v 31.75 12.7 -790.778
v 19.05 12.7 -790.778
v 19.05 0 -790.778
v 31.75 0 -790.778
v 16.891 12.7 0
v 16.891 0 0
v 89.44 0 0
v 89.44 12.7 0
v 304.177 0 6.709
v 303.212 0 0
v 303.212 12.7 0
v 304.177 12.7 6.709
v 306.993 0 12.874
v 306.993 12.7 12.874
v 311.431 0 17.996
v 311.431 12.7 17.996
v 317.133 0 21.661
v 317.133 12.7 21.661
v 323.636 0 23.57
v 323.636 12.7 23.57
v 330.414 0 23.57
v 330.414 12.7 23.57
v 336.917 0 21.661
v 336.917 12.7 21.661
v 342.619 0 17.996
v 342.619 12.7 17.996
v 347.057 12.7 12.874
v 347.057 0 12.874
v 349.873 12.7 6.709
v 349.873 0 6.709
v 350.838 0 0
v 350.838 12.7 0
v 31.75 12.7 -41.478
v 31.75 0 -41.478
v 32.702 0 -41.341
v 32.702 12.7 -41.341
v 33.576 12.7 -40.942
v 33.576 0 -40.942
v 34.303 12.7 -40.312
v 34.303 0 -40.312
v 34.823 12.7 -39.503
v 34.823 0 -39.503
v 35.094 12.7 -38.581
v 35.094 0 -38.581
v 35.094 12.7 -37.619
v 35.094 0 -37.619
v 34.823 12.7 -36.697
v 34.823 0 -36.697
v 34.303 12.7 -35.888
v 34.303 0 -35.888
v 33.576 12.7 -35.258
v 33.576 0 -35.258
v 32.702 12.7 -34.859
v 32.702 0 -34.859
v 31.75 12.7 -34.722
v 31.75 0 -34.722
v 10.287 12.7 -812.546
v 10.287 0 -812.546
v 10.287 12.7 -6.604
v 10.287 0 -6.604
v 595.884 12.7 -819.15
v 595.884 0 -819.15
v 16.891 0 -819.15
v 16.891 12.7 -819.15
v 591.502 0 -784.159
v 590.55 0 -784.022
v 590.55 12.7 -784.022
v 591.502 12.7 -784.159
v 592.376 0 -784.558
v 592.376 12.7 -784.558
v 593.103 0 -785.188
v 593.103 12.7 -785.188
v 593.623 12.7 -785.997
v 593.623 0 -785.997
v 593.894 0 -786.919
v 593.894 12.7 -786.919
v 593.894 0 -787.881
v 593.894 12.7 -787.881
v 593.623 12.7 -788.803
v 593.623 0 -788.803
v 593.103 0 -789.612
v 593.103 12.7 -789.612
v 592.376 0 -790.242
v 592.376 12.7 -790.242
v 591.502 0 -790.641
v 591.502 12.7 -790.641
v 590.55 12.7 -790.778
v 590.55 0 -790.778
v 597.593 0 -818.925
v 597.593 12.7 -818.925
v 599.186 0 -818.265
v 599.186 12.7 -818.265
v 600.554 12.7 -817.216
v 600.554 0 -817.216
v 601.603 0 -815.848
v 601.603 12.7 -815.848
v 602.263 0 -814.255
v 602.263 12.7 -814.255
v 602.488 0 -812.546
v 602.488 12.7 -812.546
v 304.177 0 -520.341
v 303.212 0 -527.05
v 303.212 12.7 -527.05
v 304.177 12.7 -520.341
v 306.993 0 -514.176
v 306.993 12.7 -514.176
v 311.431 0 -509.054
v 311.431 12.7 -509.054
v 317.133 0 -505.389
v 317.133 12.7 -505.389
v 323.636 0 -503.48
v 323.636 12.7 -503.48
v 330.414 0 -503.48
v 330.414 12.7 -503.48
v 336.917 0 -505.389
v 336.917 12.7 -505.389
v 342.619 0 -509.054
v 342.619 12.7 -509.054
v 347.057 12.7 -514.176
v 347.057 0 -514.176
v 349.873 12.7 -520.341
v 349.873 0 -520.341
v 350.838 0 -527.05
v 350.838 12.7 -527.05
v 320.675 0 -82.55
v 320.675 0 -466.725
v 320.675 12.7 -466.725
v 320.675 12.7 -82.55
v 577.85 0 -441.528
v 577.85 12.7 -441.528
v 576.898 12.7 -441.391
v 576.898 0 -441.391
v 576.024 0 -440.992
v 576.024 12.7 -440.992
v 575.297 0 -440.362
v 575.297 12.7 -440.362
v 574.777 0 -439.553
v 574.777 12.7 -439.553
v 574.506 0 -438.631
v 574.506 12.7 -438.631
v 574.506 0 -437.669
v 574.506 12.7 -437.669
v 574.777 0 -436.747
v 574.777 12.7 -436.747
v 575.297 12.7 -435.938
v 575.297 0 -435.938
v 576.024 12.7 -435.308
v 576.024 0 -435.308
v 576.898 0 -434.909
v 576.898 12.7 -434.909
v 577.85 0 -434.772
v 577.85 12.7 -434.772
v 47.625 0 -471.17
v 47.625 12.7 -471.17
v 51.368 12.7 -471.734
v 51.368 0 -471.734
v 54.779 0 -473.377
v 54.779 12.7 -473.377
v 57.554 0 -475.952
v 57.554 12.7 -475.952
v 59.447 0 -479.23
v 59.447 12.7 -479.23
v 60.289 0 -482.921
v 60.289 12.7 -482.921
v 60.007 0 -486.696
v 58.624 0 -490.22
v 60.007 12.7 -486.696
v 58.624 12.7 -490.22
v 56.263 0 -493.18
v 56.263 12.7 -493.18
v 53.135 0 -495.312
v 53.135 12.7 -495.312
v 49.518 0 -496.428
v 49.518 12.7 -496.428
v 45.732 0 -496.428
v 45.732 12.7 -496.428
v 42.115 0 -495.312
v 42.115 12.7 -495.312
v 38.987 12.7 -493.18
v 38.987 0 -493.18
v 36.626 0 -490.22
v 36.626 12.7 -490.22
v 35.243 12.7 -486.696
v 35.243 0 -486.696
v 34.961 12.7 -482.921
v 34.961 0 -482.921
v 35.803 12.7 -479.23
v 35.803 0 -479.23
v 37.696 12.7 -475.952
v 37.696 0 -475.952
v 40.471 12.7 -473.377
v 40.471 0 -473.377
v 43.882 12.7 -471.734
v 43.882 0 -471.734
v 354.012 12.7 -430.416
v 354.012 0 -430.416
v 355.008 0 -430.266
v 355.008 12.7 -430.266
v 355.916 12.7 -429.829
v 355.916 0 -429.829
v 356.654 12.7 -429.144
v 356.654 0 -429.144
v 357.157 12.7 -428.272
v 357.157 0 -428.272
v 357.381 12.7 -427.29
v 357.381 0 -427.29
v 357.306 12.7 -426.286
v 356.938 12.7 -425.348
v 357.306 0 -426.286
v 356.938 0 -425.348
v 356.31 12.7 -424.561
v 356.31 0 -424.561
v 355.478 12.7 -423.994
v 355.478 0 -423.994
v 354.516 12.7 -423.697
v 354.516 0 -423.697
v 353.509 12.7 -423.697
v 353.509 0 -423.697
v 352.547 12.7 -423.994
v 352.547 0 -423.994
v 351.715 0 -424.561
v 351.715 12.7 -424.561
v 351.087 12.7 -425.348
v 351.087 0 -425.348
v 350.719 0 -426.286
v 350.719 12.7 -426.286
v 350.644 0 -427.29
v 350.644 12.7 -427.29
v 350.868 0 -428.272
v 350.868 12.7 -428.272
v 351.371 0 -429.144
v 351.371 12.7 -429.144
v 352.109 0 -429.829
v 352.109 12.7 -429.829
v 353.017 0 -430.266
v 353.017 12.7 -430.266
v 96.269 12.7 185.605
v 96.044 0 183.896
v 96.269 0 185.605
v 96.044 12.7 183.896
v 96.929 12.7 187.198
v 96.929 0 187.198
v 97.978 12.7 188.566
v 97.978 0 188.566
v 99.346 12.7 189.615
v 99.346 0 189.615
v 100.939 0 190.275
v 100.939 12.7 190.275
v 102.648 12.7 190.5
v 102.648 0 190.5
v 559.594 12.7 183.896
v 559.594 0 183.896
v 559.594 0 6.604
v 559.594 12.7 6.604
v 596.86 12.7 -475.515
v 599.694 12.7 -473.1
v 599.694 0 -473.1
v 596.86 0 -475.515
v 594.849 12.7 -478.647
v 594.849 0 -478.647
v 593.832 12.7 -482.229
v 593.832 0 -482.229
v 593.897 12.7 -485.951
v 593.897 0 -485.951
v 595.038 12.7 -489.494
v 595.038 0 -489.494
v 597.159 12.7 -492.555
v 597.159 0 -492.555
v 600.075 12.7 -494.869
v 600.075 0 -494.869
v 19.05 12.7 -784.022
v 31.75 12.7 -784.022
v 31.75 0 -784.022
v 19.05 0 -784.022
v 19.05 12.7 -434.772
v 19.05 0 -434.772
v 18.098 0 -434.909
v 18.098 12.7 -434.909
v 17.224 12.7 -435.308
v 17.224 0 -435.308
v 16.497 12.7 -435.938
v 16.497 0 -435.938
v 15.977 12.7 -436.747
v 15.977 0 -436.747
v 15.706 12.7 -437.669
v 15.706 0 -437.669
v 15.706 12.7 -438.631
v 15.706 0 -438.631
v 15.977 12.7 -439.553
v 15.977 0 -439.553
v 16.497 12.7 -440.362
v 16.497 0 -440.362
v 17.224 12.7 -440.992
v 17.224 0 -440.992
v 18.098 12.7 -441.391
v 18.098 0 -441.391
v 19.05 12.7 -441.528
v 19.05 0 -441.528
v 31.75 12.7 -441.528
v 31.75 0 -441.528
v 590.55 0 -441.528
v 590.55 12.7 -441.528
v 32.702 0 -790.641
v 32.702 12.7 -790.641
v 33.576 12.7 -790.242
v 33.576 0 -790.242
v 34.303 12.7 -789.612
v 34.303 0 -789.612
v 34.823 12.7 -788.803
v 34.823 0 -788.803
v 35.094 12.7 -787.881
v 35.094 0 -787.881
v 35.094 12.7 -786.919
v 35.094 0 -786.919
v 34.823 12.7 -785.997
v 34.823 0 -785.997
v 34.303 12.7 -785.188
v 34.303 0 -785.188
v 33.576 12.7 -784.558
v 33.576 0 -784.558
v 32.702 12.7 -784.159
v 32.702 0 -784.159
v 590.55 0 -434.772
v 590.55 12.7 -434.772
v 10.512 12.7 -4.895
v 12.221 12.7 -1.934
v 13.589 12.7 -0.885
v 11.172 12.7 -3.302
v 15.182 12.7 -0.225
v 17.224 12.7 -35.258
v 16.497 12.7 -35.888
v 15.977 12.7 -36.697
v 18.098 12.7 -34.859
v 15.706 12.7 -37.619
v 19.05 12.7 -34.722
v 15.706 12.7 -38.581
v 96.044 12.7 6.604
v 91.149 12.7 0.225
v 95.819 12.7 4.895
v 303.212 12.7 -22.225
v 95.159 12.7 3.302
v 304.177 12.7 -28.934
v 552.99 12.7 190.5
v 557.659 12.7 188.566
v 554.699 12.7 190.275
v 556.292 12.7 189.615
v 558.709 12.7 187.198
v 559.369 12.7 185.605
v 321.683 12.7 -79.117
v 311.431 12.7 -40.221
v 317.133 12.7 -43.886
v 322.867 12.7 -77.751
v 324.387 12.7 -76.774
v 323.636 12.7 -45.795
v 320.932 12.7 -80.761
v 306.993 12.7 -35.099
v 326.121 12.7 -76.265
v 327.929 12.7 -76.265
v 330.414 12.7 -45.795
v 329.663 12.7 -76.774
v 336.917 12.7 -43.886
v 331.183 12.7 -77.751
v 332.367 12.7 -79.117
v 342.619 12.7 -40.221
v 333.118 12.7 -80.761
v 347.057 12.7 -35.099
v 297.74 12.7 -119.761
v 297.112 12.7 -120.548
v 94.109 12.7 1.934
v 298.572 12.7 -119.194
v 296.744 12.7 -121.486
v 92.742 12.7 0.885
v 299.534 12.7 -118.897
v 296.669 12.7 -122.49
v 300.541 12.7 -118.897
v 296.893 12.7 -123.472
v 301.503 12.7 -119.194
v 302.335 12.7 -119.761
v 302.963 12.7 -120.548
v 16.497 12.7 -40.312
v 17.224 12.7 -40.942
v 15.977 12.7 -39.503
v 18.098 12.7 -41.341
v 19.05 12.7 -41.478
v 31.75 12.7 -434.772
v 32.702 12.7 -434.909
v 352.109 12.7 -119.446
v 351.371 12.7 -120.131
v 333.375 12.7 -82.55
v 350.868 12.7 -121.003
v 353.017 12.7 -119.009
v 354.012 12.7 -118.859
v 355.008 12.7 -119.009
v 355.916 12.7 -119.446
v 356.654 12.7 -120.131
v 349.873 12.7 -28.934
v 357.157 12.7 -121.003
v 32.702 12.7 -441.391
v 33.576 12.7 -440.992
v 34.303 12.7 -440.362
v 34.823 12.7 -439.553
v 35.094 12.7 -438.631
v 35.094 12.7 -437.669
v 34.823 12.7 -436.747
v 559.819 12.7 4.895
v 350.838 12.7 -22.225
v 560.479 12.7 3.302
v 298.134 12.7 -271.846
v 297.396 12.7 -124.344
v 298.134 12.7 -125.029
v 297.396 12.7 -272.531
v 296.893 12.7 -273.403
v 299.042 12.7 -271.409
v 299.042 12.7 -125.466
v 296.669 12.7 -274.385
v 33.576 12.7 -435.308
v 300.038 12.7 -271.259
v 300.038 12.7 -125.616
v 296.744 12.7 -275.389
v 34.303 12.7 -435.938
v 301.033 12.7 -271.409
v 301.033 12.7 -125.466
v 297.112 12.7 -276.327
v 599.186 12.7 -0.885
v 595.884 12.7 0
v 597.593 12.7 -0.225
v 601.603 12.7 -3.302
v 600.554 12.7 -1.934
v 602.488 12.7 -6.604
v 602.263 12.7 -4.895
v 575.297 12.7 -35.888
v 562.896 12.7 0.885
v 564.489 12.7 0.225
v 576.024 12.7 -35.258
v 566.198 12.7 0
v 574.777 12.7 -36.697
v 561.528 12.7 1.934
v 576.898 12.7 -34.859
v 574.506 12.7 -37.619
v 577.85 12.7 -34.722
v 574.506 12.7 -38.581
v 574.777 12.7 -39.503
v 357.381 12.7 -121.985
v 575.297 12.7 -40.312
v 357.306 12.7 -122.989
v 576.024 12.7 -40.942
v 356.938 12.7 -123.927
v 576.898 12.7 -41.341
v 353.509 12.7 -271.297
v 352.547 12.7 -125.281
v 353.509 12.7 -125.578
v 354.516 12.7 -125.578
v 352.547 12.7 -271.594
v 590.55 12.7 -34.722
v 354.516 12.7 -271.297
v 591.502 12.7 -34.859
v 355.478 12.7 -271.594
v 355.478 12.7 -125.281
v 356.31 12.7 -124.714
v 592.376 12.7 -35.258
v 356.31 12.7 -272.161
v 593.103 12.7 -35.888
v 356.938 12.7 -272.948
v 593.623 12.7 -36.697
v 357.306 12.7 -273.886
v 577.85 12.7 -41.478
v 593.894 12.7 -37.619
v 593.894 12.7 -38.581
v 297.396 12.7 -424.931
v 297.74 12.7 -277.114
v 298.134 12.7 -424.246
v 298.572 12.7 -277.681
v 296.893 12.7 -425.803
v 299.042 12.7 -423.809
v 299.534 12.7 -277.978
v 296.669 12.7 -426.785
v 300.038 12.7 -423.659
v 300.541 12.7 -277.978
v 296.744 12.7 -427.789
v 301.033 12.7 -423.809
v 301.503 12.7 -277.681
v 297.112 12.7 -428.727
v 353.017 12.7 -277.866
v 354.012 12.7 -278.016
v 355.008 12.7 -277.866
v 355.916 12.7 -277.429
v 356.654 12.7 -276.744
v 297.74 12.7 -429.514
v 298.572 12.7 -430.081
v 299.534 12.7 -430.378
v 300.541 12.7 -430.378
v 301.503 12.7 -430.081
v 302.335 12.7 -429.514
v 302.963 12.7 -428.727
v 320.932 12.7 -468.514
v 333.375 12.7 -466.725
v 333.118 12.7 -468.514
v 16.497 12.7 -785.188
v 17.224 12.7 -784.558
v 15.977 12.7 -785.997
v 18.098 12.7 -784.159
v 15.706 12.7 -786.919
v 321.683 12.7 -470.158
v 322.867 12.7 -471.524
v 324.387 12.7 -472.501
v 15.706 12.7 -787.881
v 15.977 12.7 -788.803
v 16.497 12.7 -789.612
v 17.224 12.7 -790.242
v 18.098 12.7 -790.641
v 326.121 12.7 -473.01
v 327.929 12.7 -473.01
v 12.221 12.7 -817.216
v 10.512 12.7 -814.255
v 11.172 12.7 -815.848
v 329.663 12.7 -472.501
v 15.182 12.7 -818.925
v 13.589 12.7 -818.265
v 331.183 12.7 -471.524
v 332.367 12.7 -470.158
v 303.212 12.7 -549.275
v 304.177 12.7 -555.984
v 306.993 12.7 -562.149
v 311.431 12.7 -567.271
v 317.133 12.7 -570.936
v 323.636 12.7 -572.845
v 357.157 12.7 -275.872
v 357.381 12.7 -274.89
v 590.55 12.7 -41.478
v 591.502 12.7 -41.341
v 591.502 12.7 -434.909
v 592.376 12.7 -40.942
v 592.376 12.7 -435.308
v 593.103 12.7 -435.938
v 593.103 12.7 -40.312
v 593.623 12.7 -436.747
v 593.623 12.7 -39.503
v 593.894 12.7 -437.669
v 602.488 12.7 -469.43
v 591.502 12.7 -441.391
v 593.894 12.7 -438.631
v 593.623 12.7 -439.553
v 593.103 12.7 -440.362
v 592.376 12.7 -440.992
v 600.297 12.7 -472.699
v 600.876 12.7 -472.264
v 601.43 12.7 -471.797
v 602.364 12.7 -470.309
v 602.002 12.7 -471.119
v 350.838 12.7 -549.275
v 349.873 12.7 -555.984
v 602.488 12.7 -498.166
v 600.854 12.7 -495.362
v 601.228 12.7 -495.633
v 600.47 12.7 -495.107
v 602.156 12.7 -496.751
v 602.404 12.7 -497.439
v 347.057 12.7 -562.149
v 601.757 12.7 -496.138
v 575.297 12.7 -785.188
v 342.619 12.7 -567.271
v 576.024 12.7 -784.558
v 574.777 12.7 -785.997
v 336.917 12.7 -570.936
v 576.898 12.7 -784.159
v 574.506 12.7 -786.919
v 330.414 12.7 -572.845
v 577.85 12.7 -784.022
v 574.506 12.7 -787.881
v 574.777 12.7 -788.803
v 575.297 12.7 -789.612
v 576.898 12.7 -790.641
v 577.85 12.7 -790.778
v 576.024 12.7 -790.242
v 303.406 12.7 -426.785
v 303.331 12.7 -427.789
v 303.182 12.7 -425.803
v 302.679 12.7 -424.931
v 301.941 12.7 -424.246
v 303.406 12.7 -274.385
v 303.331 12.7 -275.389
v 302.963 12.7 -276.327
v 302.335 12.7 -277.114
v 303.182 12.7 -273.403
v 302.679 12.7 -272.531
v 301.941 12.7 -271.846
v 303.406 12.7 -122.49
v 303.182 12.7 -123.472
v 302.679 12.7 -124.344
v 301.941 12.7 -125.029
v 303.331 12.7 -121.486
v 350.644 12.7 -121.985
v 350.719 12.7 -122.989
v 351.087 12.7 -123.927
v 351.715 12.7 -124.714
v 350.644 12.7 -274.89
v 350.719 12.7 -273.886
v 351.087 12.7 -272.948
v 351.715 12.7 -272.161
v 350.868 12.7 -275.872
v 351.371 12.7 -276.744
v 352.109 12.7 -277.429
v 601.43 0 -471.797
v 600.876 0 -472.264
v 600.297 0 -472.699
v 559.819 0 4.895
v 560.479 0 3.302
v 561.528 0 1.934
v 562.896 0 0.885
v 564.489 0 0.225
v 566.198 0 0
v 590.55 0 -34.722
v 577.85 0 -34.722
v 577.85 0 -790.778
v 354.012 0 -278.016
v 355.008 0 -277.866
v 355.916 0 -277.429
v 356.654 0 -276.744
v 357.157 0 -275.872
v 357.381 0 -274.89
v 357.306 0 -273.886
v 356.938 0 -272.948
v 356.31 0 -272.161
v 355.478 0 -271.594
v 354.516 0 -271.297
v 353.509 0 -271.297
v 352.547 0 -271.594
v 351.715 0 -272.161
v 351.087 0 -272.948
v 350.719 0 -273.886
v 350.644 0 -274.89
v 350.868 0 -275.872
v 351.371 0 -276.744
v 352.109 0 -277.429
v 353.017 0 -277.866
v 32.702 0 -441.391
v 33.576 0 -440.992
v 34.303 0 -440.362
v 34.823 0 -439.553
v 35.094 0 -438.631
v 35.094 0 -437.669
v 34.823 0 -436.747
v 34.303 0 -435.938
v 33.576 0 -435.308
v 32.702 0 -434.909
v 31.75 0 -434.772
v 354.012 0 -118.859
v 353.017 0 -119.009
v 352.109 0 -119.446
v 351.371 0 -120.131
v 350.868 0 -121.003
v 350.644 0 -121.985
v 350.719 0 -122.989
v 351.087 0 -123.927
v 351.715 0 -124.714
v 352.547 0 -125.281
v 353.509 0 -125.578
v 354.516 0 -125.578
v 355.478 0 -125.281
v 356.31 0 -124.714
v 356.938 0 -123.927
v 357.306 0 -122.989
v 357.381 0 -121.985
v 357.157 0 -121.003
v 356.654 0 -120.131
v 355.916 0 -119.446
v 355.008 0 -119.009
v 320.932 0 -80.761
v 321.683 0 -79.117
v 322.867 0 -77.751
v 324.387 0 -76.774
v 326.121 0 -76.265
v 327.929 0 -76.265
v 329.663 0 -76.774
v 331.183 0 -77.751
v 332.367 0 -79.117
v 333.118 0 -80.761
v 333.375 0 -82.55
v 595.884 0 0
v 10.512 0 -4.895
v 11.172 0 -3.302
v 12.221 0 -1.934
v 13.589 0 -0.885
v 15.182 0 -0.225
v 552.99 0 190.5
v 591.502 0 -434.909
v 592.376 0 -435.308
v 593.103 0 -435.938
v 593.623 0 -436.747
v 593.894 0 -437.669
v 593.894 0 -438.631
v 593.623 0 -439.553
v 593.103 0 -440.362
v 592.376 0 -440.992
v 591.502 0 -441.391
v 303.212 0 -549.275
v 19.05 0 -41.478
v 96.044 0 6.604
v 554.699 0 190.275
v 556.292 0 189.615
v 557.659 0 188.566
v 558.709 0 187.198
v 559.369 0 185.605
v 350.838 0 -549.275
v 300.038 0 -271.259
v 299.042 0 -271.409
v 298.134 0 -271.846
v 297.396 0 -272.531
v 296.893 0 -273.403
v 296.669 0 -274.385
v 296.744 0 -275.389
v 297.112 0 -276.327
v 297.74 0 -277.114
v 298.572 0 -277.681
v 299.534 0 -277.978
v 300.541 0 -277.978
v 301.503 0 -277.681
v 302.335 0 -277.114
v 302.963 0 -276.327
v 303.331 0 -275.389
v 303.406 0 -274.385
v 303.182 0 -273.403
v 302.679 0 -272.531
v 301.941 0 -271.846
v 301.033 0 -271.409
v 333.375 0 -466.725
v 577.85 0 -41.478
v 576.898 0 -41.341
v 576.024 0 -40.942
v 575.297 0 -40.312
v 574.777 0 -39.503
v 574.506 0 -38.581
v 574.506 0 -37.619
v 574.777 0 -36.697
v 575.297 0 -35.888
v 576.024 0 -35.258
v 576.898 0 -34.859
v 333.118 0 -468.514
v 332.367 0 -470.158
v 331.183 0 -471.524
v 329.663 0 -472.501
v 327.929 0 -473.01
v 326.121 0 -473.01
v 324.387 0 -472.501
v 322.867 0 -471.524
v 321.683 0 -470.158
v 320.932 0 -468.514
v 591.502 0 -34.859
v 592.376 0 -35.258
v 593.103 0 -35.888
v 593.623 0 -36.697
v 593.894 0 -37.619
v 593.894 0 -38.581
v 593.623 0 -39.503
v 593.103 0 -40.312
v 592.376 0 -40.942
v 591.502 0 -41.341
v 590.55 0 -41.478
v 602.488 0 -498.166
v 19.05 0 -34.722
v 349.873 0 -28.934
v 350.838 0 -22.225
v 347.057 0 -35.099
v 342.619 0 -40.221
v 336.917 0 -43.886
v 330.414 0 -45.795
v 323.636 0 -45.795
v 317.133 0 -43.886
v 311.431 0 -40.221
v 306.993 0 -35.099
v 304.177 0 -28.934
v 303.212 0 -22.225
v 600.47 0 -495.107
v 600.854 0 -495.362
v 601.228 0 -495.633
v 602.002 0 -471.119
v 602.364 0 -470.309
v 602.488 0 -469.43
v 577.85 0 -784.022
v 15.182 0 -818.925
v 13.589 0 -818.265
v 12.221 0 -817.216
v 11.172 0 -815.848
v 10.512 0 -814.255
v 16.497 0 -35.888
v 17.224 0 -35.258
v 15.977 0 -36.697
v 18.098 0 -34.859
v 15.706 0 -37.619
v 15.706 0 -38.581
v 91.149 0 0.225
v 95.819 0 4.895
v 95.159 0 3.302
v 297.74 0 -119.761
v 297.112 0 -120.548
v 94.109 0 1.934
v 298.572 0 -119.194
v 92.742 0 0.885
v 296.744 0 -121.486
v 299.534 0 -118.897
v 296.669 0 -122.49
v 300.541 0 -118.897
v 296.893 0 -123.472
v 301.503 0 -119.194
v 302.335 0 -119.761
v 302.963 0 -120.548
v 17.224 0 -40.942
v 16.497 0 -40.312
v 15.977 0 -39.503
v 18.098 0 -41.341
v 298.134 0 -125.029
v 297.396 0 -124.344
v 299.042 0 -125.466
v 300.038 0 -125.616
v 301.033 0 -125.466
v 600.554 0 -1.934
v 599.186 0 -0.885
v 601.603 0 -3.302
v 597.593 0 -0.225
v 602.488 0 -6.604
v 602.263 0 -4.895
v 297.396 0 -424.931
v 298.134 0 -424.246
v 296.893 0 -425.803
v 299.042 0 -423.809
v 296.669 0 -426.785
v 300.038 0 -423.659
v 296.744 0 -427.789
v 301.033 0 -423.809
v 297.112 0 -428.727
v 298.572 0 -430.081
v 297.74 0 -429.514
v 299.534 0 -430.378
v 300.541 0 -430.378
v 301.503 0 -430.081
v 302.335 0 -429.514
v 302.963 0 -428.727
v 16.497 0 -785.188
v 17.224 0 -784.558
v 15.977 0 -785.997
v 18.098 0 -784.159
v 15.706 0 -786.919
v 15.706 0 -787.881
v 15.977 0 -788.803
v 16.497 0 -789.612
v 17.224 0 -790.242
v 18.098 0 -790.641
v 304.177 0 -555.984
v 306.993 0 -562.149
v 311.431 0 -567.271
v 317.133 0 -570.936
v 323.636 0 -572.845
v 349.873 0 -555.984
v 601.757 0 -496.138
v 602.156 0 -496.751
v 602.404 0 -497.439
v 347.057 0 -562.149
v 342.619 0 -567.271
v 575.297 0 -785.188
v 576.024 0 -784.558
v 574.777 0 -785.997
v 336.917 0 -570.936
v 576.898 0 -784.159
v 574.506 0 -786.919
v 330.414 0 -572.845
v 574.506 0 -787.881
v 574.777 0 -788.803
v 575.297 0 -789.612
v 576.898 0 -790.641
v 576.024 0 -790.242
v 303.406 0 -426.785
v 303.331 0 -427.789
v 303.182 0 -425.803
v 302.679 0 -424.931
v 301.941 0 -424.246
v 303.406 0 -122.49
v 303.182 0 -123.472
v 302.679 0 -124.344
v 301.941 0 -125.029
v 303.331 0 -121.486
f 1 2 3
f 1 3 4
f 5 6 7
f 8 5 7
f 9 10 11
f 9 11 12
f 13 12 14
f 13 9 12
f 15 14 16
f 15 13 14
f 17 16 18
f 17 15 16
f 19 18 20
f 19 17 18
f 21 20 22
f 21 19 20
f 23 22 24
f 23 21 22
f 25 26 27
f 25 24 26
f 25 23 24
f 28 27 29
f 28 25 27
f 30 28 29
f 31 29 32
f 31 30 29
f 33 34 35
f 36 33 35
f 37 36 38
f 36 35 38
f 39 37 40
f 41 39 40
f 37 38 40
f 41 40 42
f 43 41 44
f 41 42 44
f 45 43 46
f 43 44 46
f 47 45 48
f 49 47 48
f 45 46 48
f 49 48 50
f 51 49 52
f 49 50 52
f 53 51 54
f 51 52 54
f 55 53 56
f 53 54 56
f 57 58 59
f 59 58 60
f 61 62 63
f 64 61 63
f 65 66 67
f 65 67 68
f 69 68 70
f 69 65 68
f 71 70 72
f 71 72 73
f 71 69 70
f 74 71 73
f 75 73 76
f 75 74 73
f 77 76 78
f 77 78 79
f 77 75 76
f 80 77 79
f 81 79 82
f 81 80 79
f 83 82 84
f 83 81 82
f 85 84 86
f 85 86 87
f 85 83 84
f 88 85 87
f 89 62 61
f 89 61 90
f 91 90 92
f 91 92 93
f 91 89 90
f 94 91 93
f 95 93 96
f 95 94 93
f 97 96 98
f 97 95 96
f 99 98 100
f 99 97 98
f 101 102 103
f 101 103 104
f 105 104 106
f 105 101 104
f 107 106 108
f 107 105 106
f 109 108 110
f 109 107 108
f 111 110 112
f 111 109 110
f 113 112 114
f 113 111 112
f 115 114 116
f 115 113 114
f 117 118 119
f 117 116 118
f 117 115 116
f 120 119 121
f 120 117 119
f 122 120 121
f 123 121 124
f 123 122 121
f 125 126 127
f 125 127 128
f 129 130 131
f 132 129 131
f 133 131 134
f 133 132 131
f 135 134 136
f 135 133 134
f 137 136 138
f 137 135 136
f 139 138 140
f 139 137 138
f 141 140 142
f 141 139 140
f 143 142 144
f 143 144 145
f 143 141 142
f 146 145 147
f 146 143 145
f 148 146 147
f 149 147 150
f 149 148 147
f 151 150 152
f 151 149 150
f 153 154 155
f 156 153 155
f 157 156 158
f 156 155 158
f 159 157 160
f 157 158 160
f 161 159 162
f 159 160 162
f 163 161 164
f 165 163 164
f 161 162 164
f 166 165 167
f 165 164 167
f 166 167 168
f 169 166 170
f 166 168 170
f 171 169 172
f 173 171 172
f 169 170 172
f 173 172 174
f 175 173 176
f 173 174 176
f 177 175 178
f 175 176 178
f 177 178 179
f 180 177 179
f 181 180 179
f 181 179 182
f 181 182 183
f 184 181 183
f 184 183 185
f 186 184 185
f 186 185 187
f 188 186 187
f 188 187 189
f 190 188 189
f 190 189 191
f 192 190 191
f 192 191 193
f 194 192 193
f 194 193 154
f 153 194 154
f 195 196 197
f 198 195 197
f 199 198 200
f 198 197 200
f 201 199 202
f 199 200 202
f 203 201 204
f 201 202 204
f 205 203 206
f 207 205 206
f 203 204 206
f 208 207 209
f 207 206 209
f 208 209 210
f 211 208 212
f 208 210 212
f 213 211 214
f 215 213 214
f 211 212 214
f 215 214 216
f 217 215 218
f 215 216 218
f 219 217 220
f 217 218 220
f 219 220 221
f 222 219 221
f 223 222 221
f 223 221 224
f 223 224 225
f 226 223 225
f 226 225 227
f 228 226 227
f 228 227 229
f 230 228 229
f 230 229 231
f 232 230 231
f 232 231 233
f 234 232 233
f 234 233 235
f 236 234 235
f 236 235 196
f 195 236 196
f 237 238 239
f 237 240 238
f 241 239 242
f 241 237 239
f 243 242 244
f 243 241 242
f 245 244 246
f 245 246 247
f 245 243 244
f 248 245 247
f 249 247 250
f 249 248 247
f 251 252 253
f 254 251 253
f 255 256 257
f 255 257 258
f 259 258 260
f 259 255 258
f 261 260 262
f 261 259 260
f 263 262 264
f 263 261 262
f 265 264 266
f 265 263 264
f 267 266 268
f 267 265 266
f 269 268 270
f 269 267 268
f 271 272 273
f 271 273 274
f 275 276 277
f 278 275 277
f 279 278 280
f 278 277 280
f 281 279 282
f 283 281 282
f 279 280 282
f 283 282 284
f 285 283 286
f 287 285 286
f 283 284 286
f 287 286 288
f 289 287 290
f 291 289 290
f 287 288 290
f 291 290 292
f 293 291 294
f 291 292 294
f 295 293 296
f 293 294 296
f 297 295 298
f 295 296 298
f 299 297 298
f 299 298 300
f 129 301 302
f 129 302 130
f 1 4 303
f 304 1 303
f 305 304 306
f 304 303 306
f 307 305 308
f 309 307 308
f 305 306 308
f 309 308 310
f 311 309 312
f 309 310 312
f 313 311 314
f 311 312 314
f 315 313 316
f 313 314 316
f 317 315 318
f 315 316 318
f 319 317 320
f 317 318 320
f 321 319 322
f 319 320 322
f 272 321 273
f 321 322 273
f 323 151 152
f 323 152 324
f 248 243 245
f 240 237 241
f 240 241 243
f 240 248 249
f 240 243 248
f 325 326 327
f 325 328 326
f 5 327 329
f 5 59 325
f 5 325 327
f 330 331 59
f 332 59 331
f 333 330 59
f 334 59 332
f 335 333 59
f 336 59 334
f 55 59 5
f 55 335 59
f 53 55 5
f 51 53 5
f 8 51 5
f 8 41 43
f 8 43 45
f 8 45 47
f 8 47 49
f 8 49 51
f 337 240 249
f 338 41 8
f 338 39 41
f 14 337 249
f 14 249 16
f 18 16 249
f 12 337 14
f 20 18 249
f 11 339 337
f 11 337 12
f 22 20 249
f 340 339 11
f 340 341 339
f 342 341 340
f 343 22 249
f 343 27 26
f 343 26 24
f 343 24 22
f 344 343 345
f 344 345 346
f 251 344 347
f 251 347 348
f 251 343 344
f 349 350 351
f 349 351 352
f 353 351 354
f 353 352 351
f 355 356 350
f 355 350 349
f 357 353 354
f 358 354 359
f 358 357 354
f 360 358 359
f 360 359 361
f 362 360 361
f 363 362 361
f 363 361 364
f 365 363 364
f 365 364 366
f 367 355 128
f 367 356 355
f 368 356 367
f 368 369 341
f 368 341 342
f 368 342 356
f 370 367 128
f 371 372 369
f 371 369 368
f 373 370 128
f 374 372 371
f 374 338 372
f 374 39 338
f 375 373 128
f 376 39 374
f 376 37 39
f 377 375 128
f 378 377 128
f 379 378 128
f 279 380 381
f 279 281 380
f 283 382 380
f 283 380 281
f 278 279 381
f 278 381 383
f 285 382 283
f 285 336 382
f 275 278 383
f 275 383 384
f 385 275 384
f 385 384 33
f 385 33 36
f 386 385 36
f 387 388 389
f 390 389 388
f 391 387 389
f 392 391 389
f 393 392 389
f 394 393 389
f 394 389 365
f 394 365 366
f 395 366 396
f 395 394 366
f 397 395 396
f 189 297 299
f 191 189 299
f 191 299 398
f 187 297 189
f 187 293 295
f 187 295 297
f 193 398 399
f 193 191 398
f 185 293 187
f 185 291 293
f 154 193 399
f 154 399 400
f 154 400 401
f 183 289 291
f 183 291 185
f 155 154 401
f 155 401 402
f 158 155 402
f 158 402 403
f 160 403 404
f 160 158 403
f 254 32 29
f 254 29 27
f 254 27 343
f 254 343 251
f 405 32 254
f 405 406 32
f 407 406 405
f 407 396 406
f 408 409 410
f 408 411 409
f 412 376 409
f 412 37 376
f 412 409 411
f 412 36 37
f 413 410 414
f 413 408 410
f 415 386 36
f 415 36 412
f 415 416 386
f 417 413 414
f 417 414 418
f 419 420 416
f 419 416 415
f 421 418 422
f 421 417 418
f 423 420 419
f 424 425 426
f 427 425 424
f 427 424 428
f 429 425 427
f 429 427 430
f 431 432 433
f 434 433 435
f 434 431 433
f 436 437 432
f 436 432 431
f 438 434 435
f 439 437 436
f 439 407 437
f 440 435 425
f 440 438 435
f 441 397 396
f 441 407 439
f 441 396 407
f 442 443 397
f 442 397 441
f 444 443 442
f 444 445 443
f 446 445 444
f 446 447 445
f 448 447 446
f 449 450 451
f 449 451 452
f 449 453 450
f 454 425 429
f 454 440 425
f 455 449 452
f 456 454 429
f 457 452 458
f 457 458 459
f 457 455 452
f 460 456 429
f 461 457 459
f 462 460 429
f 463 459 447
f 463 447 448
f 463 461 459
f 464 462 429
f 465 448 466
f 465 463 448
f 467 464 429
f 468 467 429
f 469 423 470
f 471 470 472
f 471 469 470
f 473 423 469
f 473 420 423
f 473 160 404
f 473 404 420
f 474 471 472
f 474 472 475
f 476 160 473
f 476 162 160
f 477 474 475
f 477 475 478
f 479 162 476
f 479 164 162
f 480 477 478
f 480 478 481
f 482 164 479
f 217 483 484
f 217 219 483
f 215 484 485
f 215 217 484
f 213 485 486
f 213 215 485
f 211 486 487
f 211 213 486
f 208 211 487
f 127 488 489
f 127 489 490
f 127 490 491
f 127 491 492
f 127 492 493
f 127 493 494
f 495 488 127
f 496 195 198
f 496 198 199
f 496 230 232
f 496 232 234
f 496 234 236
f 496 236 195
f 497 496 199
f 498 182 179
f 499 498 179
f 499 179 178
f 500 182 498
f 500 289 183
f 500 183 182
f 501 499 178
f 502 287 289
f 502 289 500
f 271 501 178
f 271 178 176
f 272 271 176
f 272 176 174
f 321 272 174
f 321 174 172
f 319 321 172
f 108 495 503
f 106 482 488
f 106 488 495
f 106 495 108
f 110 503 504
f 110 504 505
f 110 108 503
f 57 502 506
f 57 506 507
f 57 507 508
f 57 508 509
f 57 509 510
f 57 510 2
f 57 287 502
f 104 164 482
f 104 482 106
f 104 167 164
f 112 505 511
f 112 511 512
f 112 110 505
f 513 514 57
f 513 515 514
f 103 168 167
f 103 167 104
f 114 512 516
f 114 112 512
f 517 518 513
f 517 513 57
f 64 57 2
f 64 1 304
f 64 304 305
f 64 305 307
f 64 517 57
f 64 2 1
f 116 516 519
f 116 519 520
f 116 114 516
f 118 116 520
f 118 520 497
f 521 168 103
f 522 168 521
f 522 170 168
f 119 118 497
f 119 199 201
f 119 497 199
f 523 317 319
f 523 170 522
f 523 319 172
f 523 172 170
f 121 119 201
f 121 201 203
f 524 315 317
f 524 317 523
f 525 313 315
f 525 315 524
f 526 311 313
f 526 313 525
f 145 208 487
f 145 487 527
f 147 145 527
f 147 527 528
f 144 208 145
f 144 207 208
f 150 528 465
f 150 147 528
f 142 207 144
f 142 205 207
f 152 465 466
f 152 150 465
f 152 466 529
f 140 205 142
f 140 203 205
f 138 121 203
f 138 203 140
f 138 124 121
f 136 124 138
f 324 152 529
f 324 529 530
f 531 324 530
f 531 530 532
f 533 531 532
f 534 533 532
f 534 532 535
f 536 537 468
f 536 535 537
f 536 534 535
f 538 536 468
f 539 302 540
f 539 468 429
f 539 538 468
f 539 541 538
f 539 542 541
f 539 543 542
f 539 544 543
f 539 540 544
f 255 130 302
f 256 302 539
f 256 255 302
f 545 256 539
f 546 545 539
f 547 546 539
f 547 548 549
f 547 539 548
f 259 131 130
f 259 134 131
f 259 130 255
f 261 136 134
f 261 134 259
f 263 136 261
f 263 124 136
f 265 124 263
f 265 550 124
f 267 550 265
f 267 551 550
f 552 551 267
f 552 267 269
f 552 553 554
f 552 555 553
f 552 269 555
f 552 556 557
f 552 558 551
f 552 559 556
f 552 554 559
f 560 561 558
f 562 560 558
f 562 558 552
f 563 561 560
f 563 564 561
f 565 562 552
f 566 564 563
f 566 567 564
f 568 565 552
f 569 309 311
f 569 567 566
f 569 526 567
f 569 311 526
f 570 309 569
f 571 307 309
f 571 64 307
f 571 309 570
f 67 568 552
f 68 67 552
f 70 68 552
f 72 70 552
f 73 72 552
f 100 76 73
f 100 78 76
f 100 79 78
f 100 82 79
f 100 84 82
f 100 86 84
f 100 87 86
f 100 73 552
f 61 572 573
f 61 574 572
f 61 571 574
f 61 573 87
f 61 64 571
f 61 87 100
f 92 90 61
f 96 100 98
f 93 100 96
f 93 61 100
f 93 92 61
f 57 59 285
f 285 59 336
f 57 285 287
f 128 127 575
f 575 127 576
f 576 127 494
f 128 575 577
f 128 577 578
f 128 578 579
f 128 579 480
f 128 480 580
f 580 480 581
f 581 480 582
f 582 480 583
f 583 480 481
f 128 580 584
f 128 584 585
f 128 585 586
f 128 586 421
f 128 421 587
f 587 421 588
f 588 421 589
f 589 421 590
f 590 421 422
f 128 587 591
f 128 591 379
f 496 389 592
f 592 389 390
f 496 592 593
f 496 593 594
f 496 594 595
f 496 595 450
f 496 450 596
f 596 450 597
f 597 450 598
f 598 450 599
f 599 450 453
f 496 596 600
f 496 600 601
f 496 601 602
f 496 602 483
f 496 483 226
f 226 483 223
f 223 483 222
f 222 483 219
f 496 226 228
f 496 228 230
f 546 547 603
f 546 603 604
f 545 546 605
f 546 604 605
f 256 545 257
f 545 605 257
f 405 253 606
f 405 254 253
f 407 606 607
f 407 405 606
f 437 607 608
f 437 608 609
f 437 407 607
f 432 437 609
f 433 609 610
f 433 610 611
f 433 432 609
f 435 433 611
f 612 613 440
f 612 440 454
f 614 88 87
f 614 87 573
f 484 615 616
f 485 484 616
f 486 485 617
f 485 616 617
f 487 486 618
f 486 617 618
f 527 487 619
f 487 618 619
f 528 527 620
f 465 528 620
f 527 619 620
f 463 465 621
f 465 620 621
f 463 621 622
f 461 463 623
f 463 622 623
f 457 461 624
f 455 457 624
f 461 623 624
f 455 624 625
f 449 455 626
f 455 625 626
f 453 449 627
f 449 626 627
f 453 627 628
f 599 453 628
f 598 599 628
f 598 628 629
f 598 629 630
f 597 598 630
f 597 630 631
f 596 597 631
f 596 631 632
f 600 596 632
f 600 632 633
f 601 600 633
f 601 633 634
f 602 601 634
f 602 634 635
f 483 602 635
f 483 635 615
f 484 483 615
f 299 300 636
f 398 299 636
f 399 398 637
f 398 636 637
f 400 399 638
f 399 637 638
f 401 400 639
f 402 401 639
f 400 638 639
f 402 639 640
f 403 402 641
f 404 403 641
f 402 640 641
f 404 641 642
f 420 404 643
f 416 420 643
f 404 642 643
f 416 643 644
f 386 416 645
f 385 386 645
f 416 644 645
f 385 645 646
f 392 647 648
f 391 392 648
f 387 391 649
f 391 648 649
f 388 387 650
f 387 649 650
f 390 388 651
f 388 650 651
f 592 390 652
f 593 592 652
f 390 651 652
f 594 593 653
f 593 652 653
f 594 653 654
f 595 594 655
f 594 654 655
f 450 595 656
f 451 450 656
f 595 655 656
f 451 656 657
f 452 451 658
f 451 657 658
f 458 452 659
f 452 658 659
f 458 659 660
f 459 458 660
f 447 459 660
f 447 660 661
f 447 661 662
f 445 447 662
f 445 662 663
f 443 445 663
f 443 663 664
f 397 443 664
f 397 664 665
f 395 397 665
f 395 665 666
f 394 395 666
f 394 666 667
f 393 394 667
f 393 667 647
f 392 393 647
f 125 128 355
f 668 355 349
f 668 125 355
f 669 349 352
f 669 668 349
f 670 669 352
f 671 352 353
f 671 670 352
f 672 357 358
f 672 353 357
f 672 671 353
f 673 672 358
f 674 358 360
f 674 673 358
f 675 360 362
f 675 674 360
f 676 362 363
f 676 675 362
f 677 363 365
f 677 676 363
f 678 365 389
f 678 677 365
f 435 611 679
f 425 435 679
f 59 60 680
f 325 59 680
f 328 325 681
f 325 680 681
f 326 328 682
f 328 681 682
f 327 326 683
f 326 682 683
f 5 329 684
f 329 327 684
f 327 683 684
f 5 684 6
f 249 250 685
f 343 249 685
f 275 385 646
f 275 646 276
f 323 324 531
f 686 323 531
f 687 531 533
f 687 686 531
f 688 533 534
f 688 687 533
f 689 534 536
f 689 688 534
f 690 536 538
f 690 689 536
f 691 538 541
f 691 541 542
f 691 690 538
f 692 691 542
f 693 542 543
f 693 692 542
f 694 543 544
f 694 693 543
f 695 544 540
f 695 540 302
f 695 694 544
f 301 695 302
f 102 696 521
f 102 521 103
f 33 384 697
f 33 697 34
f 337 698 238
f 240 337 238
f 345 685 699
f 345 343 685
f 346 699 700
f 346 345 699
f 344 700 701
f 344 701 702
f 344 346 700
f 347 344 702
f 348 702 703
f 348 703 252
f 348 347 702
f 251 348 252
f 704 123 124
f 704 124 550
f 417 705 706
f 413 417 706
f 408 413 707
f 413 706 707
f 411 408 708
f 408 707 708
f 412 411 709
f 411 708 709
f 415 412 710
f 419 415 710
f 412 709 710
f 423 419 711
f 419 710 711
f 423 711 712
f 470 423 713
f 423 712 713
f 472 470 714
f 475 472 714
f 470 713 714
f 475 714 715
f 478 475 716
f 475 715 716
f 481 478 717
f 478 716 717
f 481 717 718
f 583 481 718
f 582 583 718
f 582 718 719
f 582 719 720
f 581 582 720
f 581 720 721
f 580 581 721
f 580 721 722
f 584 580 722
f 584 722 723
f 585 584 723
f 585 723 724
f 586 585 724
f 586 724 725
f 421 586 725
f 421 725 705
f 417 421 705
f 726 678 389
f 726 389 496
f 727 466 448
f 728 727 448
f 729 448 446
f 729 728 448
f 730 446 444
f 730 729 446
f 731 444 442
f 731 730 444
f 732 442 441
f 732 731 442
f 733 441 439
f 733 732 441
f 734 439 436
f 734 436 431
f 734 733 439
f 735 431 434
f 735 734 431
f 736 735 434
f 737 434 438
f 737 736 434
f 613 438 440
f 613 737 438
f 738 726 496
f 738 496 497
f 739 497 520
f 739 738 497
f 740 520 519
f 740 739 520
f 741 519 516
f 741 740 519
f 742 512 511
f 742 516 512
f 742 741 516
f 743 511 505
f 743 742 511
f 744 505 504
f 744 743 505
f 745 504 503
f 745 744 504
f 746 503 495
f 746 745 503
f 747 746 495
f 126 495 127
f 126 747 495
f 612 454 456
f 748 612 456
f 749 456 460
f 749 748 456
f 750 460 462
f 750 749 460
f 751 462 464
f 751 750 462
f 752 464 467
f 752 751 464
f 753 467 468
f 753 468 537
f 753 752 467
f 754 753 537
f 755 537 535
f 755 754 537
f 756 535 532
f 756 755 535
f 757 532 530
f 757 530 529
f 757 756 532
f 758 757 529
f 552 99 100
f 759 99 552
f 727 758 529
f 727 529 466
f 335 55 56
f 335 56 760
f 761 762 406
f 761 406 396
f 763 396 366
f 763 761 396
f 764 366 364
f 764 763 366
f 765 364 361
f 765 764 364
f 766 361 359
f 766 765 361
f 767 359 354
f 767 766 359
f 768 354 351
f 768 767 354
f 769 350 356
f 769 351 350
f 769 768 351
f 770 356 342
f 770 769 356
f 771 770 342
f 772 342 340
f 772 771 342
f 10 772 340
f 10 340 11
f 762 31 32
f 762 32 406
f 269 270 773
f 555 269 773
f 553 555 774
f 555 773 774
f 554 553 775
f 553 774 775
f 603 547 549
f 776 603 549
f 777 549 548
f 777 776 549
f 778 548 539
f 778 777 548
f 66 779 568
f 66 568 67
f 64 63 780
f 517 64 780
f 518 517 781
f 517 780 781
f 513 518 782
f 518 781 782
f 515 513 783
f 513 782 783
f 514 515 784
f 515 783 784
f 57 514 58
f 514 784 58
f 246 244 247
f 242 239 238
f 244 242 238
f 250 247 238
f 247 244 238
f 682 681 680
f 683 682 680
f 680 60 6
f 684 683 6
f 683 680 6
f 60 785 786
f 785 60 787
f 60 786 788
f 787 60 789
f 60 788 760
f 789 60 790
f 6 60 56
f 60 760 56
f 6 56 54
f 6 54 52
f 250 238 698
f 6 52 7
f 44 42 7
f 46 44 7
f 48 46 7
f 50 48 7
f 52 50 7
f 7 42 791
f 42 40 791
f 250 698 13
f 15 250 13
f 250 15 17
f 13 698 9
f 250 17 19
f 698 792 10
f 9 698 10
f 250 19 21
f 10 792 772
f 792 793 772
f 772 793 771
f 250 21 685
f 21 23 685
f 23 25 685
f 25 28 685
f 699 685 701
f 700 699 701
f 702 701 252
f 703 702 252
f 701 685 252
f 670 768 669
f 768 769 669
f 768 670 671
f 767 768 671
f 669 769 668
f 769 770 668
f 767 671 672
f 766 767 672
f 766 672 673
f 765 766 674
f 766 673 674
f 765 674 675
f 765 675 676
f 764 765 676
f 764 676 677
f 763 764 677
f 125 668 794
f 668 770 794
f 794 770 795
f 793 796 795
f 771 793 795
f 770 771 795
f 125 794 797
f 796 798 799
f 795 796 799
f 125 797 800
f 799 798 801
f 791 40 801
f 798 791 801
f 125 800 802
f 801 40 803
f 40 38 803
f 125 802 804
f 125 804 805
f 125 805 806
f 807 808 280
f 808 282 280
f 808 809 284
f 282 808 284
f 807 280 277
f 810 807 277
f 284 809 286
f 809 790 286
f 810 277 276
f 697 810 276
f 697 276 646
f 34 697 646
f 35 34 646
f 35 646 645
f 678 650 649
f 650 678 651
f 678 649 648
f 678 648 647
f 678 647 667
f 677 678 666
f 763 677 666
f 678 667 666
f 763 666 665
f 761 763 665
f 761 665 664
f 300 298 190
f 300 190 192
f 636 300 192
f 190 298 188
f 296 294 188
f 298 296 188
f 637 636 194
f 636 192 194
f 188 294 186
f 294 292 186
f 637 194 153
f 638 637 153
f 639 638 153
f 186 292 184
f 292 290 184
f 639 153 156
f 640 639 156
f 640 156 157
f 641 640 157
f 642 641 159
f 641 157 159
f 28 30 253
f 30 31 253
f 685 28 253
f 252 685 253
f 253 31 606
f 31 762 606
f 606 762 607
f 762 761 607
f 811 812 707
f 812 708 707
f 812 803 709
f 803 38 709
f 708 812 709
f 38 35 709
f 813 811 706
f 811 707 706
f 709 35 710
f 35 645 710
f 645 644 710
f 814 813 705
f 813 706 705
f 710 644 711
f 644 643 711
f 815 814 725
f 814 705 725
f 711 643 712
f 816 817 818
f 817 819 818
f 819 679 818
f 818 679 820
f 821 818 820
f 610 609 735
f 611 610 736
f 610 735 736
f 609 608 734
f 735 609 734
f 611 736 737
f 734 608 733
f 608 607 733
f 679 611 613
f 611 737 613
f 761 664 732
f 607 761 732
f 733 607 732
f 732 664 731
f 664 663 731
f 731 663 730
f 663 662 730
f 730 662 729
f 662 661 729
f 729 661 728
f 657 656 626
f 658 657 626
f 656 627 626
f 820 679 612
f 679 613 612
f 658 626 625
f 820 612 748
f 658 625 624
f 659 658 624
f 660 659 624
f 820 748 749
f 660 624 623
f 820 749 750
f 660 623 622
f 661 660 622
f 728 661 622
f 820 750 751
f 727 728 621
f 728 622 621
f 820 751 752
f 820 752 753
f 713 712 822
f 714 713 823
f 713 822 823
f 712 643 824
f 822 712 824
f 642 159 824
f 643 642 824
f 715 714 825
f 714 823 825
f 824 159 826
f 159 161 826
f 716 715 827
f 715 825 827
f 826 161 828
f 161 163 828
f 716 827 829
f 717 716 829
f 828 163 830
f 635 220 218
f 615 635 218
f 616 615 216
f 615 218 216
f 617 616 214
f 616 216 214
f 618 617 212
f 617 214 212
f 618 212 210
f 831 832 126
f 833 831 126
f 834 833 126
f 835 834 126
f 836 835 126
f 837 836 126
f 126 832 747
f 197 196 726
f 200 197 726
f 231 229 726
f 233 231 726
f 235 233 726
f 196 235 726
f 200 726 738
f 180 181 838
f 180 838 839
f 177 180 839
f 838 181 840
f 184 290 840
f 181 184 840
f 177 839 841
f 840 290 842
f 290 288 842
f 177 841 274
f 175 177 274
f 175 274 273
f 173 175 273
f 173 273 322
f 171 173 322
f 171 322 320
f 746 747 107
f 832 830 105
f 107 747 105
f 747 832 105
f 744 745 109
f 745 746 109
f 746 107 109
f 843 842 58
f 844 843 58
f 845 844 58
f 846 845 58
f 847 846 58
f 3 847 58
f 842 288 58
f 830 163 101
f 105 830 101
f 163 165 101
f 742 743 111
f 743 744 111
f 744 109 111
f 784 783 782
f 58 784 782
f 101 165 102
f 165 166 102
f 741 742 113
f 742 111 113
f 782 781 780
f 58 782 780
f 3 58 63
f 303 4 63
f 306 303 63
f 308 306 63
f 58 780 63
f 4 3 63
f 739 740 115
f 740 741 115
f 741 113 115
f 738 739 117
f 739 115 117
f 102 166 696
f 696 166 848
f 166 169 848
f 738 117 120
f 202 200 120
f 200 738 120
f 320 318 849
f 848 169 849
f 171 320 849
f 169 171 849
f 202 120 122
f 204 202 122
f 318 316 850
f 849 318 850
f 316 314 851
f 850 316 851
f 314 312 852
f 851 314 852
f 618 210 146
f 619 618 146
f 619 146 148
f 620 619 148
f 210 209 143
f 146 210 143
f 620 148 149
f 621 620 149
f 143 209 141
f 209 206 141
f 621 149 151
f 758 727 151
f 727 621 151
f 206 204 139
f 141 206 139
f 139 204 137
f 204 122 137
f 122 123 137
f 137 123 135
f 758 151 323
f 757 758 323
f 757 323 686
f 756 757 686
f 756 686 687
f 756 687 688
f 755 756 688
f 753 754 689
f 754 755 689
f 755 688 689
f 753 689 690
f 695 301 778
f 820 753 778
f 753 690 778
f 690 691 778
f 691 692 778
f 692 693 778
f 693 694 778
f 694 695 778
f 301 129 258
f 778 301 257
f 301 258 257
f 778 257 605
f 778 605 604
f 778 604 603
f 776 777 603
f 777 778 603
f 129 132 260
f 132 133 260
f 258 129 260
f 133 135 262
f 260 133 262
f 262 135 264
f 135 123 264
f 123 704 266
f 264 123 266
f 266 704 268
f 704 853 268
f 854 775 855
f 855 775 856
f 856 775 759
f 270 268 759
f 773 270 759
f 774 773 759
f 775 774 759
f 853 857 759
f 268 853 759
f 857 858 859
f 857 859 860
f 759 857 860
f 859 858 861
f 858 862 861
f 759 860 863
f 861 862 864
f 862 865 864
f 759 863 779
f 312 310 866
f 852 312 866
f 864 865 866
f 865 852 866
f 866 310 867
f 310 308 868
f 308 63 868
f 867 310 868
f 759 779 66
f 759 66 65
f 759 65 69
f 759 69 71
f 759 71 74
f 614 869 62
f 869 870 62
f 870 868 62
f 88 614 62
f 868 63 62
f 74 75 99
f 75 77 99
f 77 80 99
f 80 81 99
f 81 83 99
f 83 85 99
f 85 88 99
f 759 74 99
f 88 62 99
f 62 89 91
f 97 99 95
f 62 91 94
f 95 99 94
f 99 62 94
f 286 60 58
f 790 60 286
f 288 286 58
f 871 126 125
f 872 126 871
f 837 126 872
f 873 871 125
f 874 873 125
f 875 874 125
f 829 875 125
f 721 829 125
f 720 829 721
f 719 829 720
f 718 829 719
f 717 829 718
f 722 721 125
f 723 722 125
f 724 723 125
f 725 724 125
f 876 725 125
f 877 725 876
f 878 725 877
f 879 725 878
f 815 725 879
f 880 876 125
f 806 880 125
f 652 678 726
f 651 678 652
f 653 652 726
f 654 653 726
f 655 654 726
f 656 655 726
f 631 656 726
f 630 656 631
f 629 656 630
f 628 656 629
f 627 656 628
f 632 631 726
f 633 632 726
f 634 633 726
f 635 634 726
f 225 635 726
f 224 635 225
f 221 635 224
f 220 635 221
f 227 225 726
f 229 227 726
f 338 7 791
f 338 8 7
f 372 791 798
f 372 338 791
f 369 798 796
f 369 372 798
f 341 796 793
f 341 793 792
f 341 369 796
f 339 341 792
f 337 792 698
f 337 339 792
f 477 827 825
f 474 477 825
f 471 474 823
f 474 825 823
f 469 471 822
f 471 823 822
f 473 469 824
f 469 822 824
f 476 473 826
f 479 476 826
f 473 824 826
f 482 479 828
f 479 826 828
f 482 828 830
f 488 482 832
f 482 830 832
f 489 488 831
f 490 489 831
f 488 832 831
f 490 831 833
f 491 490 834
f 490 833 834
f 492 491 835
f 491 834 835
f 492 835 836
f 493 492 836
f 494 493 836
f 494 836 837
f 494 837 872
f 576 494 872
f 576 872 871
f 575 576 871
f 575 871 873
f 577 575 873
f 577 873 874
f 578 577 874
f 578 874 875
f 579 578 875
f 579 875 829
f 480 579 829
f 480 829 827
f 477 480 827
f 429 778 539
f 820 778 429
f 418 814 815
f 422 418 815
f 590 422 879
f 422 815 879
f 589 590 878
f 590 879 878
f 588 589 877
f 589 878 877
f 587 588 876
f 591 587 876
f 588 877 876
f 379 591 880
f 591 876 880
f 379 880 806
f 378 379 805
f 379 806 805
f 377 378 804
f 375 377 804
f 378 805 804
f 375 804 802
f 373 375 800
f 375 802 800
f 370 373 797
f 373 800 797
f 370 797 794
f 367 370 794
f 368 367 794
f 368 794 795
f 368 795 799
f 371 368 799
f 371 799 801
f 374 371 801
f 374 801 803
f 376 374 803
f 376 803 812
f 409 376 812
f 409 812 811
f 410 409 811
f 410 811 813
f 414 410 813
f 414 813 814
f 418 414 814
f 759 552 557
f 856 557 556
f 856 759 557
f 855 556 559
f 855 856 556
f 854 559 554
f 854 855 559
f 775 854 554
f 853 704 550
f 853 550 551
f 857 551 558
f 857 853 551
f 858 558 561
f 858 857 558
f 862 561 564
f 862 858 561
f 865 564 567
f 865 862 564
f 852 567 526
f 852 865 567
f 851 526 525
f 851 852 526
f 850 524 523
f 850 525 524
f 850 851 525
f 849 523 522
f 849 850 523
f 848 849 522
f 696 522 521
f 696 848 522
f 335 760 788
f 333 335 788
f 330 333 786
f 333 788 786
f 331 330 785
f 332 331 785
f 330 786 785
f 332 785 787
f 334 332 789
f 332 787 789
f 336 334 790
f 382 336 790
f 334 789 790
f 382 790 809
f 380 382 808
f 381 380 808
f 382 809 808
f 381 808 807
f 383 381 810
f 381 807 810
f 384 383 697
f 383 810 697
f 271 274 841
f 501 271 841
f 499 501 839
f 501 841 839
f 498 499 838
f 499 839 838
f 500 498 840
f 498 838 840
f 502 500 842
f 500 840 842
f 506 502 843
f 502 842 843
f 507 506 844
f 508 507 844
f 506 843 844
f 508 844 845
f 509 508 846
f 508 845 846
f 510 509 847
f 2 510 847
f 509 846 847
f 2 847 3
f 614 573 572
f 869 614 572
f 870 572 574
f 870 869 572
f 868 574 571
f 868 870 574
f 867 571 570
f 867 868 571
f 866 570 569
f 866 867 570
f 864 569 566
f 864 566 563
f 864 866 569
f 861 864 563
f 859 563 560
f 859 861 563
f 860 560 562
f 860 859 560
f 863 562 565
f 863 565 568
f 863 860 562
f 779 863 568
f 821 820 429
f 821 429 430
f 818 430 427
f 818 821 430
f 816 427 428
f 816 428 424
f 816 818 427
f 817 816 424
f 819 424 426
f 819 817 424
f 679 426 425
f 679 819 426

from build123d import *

# Parameters (mm, degrees)
BOSS_EXTRUDE1_DEPTH = 12.7
FILLET1_R           = 6.604
FILLET2_R           = 6.604
SKETCH2_R           = 12.7
CUT_EXTRUDE1_DEPTH  = 1020.273904858
CUT_EXTRUDE3_DEPTH  = 1020.273904858
CUT_EXTRUDE4_DEPTH  = 1020.273904858
SKETCH6_R           = 3.3782
CUT_EXTRUDE5_DEPTH  = 1020.273904858
CUT_EXTRUDE6_DEPTH  = 1020.273904858
CUT_EXTRUDE7_DEPTH  = 1019.820731075
FILLET3_R           = 3.175


with BuildPart() as part:
    # Sketch1 → Boss-Extrude1 (new body)
    with BuildSketch(Plane(origin=(0, 0, 0), x_dir=(1, 0, 0), z_dir=(0, 1, 0))):
        Polygon((0, 0), (96.04375, 0), (96.04375, -190.5), (559.59375, -190.5), (559.59375, 0), (606.425, 0), (606.425, 819.15), (0, 819.15), align=None)
        with BuildLine():
            Line((19.05, 41.4782), (31.75, 41.4782))
            ThreePointArc((31.75, 41.4782), (35.1282, 38.1), (31.75, 34.7218))
            Line((31.75, 34.7218), (19.05, 34.7218))
            ThreePointArc((19.05, 34.7218), (15.6718, 38.1), (19.05, 41.4782))
        make_face(mode=Mode.SUBTRACT)
        with BuildLine():
            Line((19.05, 441.5282), (31.75, 441.5282))
            ThreePointArc((31.75, 441.5282), (35.1282, 438.15), (31.75, 434.7718))
            Line((31.75, 434.7718), (19.05, 434.7718))
            ThreePointArc((19.05, 434.7718), (15.6718, 438.15), (19.05, 441.5282))
        make_face(mode=Mode.SUBTRACT)
        with BuildLine():
            Line((31.75, 784.0218), (19.05, 784.0218))
            ThreePointArc((19.05, 784.0218), (15.6718, 787.4), (19.05, 790.7782))
            Line((19.05, 790.7782), (31.75, 790.7782))
            ThreePointArc((31.75, 790.7782), (35.1282, 787.4), (31.75, 784.0218))
        make_face(mode=Mode.SUBTRACT)
        with BuildLine():
            Line((577.85, 784.0218), (590.55, 784.0218))
            ThreePointArc((590.55, 784.0218), (593.9282, 787.4), (590.55, 790.7782))
            Line((590.55, 790.7782), (577.85, 790.7782))
            ThreePointArc((577.85, 790.7782), (574.4718, 787.4), (577.85, 784.0218))
        make_face(mode=Mode.SUBTRACT)
        with BuildLine():
            Line((590.55, 441.5282), (577.85, 441.5282))
            ThreePointArc((577.85, 441.5282), (574.4718, 438.15), (577.85, 434.7718))
            Line((577.85, 434.7718), (590.55, 434.7718))
            ThreePointArc((590.55, 434.7718), (593.9282, 438.15), (590.55, 441.5282))
        make_face(mode=Mode.SUBTRACT)
        with BuildLine():
            Line((590.55, 41.4782), (577.85, 41.4782))
            ThreePointArc((577.85, 41.4782), (574.4718, 38.1), (577.85, 34.7218))
            Line((577.85, 34.7218), (590.55, 34.7218))
            ThreePointArc((590.55, 34.7218), (593.9282, 38.1), (590.55, 41.4782))
        make_face(mode=Mode.SUBTRACT)
    extrude(amount=BOSS_EXTRUDE1_DEPTH)

    # Fillet1
    fillet1_edges = [part.edges().sort_by_distance(p)[0] for p in [
        (559.59375, 6.35, 0),
        (96.04375, 6.35, 0),
    ]]
    fillet(fillet1_edges, radius=FILLET1_R)

    # Fillet2
    fillet2_edges = [part.edges().sort_by_distance(p)[0] for p in [
        (0, 6.35, -819.15),
        (606.425, 6.35, -819.15),
        (606.425, 6.35, 0),
        (559.59375, 6.35, 190.5),
        (96.04375, 6.35, 190.5),
        (0, 6.35, 0),
    ]]
    fillet(fillet2_edges, radius=FILLET2_R)

    # Sketch2 → Cut-Extrude1 (cut, through all)
    with BuildSketch(Plane(origin=(0, 12.7, 0), x_dir=(1, 0, 0), z_dir=(0, 1, 0))):
        with Locations(Location((47.625, 483.87, 0), (0, 0, 270))):
            Circle(SKETCH2_R)
        with BuildLine():
            Line((606.425, 505.867045256), (606.425, 461.872954744))
            ThreePointArc((606.425, 461.872954744), (604.723522628, 468.222954744), (600.075, 472.871477372))
            ThreePointArc((600.075, 472.871477372), (593.725, 483.87), (600.075, 494.868522628))
            ThreePointArc((600.075, 494.868522628), (604.723522628, 499.517045256), (606.425, 505.867045256))
        make_face()
    extrude(amount=-CUT_EXTRUDE1_DEPTH, mode=Mode.SUBTRACT)

    # Sketch4 → Cut-Extrude3 (cut, through all)
    with BuildSketch(Plane.XZ):
        with BuildLine():
            Line((350.8375, -527.05), (350.8375, -549.275))
            ThreePointArc((350.8375, -549.275), (327.025, -573.0875), (303.2125, -549.275))
            Line((303.2125, -549.275), (303.2125, -527.05))
            ThreePointArc((303.2125, -527.05), (327.025, -503.2375), (350.8375, -527.05))
        make_face()
        with BuildLine():
            Line((350.8375, 0), (350.8375, -22.225))
            ThreePointArc((350.8375, -22.225), (327.025, -46.0375), (303.2125, -22.225))
            Line((303.2125, -22.225), (303.2125, 0))
            ThreePointArc((303.2125, 0), (327.025, 23.8125), (350.8375, 0))
        make_face()
    extrude(amount=-CUT_EXTRUDE3_DEPTH, mode=Mode.SUBTRACT)

    # Sketch5 → Cut-Extrude4 (cut, through all)
    with BuildSketch(Plane.XZ):
        with BuildLine():
            Line((320.675, -466.725), (320.675, -82.55))
            ThreePointArc((320.675, -82.55), (327.025, -76.2), (333.375, -82.55))
            Line((333.375, -82.55), (333.375, -466.725))
            ThreePointArc((333.375, -466.725), (327.025, -473.075), (320.675, -466.725))
        make_face()
    extrude(amount=-CUT_EXTRUDE4_DEPTH, mode=Mode.SUBTRACT)

    # Sketch6 → Cut-Extrude5 (cut, through all)
    with BuildSketch(Plane.XZ):
        with Locations(Location((354.0125, -274.6375, 0), (0, 0, 270))):
            Circle(SKETCH6_R)
        with Locations(Location((354.0125, -427.0375, 0), (0, 0, 270))):
            Circle(SKETCH6_R)
        with Locations(Location((354.0125, -122.2375, 0), (0, 0, 90))):
            Circle(SKETCH6_R)
        with Locations(Location((300.0375, -427.0375, 0), (0, 0, 90))):
            Circle(SKETCH6_R)
        with Locations(Location((300.0375, -274.6375, 0), (0, 0, 90))):
            Circle(SKETCH6_R)
        with Locations(Location((300.0375, -122.2375, 0), (0, 0, 270))):
            Circle(SKETCH6_R)
    extrude(amount=-CUT_EXTRUDE5_DEPTH, mode=Mode.SUBTRACT)

    # Sketch7 → Cut-Extrude6 (cut, through all)
    with BuildSketch(Plane.XZ):
        with BuildLine():
            ThreePointArc((605.663, -812.546), (603.728733183, -817.215733183), (599.059, -819.15))
            Line((599.059, -819.15), (599.821, -819.15))
            ThreePointArc((599.821, -819.15), (604.490733183, -817.215733183), (606.425, -812.546))
            Line((606.425, -812.546), (606.425, -505.867045256))
            ThreePointArc((606.425, -505.867045256), (604.723522628, -499.517045256), (600.075, -494.868522628))
            ThreePointArc((600.075, -494.868522628), (604.165699913, -498.959222541), (605.663, -504.547222541))
            Line((605.663, -504.547222541), (605.663, -812.546))
        make_face()
        with BuildLine():
            ThreePointArc((0.762, -812.546), (2.696266817, -817.215733183), (7.366, -819.15))
            Line((7.366, -819.15), (6.604, -819.15))
            ThreePointArc((6.604, -819.15), (1.934266817, -817.215733183), (0, -812.546))
            Line((0, -812.546), (0, -6.604))
            ThreePointArc((0, -6.604), (1.934266817, -1.934266817), (6.604, 0))
            Line((6.604, 0), (7.366, 0))
            ThreePointArc((7.366, 0), (2.696266817, -1.934266817), (0.762, -6.604))
            Line((0.762, -6.604), (0.762, -812.546))
        make_face()
        with BuildLine():
            ThreePointArc((605.663, -462.330859906), (604.07096336, -468.487413325), (599.694, -473.100429953))
            ThreePointArc((599.694, -473.100429953), (599.883498256, -472.98428666), (600.075, -472.871477372))
            ThreePointArc((600.075, -472.871477372), (604.723522628, -468.222954744), (606.425, -461.872954744))
            Line((606.425, -461.872954744), (606.425, -6.604))
            ThreePointArc((606.425, -6.604), (604.490733183, -1.934266817), (599.821, 0))
            Line((599.821, 0), (599.059, 0))
            ThreePointArc((599.059, 0), (603.728733183, -1.934266817), (605.663, -6.604))
            Line((605.663, -6.604), (605.663, -462.330859906))
        make_face()
    extrude(amount=-CUT_EXTRUDE6_DEPTH, mode=Mode.SUBTRACT)

    # Sketch8 → Cut-Extrude7 (cut, through all)
    with BuildSketch(Plane.XZ):
        with BuildLine():
            ThreePointArc((595.884, -819.15), (600.553733183, -817.215733183), (602.488, -812.546))
            Line((602.488, -812.546), (602.488, -6.604))
            ThreePointArc((602.488, -6.604), (600.553733183, -1.934266817), (595.884, 0))
            Line((595.884, 0), (599.059, 0))
            ThreePointArc((599.059, 0), (603.728733183, -1.934266817), (605.663, -6.604))
            Line((605.663, -6.604), (605.663, -812.546))
            ThreePointArc((605.663, -812.546), (603.728733183, -817.215733183), (599.059, -819.15))
            Line((599.059, -819.15), (595.884, -819.15))
        make_face()
        with BuildLine():
            Line((0.762, -6.604), (0.762, -812.546))
            ThreePointArc((0.762, -812.546), (2.696266817, -817.215733183), (7.366, -819.15))
            Line((7.366, -819.15), (16.891, -819.15))
            ThreePointArc((16.891, -819.15), (12.221266817, -817.215733183), (10.287, -812.546))
            Line((10.287, -812.546), (10.287, -6.604))
            ThreePointArc((10.287, -6.604), (12.221266817, -1.934266817), (16.891, 0))
            Line((16.891, 0), (7.366, 0))
            ThreePointArc((7.366, 0), (2.696266817, -1.934266817), (0.762, -6.604))
        make_face()
    extrude(amount=-CUT_EXTRUDE7_DEPTH, mode=Mode.SUBTRACT)

    # Fillet3
    fillet3_edges = [part.edges().sort_by_distance(p)[0] for p in [
        (602.488, 6.35, -470.731120318),
        (602.488, 6.35, -496.744211904),
    ]]
    fillet(fillet3_edges, radius=FILLET3_R)


solid = part.part
